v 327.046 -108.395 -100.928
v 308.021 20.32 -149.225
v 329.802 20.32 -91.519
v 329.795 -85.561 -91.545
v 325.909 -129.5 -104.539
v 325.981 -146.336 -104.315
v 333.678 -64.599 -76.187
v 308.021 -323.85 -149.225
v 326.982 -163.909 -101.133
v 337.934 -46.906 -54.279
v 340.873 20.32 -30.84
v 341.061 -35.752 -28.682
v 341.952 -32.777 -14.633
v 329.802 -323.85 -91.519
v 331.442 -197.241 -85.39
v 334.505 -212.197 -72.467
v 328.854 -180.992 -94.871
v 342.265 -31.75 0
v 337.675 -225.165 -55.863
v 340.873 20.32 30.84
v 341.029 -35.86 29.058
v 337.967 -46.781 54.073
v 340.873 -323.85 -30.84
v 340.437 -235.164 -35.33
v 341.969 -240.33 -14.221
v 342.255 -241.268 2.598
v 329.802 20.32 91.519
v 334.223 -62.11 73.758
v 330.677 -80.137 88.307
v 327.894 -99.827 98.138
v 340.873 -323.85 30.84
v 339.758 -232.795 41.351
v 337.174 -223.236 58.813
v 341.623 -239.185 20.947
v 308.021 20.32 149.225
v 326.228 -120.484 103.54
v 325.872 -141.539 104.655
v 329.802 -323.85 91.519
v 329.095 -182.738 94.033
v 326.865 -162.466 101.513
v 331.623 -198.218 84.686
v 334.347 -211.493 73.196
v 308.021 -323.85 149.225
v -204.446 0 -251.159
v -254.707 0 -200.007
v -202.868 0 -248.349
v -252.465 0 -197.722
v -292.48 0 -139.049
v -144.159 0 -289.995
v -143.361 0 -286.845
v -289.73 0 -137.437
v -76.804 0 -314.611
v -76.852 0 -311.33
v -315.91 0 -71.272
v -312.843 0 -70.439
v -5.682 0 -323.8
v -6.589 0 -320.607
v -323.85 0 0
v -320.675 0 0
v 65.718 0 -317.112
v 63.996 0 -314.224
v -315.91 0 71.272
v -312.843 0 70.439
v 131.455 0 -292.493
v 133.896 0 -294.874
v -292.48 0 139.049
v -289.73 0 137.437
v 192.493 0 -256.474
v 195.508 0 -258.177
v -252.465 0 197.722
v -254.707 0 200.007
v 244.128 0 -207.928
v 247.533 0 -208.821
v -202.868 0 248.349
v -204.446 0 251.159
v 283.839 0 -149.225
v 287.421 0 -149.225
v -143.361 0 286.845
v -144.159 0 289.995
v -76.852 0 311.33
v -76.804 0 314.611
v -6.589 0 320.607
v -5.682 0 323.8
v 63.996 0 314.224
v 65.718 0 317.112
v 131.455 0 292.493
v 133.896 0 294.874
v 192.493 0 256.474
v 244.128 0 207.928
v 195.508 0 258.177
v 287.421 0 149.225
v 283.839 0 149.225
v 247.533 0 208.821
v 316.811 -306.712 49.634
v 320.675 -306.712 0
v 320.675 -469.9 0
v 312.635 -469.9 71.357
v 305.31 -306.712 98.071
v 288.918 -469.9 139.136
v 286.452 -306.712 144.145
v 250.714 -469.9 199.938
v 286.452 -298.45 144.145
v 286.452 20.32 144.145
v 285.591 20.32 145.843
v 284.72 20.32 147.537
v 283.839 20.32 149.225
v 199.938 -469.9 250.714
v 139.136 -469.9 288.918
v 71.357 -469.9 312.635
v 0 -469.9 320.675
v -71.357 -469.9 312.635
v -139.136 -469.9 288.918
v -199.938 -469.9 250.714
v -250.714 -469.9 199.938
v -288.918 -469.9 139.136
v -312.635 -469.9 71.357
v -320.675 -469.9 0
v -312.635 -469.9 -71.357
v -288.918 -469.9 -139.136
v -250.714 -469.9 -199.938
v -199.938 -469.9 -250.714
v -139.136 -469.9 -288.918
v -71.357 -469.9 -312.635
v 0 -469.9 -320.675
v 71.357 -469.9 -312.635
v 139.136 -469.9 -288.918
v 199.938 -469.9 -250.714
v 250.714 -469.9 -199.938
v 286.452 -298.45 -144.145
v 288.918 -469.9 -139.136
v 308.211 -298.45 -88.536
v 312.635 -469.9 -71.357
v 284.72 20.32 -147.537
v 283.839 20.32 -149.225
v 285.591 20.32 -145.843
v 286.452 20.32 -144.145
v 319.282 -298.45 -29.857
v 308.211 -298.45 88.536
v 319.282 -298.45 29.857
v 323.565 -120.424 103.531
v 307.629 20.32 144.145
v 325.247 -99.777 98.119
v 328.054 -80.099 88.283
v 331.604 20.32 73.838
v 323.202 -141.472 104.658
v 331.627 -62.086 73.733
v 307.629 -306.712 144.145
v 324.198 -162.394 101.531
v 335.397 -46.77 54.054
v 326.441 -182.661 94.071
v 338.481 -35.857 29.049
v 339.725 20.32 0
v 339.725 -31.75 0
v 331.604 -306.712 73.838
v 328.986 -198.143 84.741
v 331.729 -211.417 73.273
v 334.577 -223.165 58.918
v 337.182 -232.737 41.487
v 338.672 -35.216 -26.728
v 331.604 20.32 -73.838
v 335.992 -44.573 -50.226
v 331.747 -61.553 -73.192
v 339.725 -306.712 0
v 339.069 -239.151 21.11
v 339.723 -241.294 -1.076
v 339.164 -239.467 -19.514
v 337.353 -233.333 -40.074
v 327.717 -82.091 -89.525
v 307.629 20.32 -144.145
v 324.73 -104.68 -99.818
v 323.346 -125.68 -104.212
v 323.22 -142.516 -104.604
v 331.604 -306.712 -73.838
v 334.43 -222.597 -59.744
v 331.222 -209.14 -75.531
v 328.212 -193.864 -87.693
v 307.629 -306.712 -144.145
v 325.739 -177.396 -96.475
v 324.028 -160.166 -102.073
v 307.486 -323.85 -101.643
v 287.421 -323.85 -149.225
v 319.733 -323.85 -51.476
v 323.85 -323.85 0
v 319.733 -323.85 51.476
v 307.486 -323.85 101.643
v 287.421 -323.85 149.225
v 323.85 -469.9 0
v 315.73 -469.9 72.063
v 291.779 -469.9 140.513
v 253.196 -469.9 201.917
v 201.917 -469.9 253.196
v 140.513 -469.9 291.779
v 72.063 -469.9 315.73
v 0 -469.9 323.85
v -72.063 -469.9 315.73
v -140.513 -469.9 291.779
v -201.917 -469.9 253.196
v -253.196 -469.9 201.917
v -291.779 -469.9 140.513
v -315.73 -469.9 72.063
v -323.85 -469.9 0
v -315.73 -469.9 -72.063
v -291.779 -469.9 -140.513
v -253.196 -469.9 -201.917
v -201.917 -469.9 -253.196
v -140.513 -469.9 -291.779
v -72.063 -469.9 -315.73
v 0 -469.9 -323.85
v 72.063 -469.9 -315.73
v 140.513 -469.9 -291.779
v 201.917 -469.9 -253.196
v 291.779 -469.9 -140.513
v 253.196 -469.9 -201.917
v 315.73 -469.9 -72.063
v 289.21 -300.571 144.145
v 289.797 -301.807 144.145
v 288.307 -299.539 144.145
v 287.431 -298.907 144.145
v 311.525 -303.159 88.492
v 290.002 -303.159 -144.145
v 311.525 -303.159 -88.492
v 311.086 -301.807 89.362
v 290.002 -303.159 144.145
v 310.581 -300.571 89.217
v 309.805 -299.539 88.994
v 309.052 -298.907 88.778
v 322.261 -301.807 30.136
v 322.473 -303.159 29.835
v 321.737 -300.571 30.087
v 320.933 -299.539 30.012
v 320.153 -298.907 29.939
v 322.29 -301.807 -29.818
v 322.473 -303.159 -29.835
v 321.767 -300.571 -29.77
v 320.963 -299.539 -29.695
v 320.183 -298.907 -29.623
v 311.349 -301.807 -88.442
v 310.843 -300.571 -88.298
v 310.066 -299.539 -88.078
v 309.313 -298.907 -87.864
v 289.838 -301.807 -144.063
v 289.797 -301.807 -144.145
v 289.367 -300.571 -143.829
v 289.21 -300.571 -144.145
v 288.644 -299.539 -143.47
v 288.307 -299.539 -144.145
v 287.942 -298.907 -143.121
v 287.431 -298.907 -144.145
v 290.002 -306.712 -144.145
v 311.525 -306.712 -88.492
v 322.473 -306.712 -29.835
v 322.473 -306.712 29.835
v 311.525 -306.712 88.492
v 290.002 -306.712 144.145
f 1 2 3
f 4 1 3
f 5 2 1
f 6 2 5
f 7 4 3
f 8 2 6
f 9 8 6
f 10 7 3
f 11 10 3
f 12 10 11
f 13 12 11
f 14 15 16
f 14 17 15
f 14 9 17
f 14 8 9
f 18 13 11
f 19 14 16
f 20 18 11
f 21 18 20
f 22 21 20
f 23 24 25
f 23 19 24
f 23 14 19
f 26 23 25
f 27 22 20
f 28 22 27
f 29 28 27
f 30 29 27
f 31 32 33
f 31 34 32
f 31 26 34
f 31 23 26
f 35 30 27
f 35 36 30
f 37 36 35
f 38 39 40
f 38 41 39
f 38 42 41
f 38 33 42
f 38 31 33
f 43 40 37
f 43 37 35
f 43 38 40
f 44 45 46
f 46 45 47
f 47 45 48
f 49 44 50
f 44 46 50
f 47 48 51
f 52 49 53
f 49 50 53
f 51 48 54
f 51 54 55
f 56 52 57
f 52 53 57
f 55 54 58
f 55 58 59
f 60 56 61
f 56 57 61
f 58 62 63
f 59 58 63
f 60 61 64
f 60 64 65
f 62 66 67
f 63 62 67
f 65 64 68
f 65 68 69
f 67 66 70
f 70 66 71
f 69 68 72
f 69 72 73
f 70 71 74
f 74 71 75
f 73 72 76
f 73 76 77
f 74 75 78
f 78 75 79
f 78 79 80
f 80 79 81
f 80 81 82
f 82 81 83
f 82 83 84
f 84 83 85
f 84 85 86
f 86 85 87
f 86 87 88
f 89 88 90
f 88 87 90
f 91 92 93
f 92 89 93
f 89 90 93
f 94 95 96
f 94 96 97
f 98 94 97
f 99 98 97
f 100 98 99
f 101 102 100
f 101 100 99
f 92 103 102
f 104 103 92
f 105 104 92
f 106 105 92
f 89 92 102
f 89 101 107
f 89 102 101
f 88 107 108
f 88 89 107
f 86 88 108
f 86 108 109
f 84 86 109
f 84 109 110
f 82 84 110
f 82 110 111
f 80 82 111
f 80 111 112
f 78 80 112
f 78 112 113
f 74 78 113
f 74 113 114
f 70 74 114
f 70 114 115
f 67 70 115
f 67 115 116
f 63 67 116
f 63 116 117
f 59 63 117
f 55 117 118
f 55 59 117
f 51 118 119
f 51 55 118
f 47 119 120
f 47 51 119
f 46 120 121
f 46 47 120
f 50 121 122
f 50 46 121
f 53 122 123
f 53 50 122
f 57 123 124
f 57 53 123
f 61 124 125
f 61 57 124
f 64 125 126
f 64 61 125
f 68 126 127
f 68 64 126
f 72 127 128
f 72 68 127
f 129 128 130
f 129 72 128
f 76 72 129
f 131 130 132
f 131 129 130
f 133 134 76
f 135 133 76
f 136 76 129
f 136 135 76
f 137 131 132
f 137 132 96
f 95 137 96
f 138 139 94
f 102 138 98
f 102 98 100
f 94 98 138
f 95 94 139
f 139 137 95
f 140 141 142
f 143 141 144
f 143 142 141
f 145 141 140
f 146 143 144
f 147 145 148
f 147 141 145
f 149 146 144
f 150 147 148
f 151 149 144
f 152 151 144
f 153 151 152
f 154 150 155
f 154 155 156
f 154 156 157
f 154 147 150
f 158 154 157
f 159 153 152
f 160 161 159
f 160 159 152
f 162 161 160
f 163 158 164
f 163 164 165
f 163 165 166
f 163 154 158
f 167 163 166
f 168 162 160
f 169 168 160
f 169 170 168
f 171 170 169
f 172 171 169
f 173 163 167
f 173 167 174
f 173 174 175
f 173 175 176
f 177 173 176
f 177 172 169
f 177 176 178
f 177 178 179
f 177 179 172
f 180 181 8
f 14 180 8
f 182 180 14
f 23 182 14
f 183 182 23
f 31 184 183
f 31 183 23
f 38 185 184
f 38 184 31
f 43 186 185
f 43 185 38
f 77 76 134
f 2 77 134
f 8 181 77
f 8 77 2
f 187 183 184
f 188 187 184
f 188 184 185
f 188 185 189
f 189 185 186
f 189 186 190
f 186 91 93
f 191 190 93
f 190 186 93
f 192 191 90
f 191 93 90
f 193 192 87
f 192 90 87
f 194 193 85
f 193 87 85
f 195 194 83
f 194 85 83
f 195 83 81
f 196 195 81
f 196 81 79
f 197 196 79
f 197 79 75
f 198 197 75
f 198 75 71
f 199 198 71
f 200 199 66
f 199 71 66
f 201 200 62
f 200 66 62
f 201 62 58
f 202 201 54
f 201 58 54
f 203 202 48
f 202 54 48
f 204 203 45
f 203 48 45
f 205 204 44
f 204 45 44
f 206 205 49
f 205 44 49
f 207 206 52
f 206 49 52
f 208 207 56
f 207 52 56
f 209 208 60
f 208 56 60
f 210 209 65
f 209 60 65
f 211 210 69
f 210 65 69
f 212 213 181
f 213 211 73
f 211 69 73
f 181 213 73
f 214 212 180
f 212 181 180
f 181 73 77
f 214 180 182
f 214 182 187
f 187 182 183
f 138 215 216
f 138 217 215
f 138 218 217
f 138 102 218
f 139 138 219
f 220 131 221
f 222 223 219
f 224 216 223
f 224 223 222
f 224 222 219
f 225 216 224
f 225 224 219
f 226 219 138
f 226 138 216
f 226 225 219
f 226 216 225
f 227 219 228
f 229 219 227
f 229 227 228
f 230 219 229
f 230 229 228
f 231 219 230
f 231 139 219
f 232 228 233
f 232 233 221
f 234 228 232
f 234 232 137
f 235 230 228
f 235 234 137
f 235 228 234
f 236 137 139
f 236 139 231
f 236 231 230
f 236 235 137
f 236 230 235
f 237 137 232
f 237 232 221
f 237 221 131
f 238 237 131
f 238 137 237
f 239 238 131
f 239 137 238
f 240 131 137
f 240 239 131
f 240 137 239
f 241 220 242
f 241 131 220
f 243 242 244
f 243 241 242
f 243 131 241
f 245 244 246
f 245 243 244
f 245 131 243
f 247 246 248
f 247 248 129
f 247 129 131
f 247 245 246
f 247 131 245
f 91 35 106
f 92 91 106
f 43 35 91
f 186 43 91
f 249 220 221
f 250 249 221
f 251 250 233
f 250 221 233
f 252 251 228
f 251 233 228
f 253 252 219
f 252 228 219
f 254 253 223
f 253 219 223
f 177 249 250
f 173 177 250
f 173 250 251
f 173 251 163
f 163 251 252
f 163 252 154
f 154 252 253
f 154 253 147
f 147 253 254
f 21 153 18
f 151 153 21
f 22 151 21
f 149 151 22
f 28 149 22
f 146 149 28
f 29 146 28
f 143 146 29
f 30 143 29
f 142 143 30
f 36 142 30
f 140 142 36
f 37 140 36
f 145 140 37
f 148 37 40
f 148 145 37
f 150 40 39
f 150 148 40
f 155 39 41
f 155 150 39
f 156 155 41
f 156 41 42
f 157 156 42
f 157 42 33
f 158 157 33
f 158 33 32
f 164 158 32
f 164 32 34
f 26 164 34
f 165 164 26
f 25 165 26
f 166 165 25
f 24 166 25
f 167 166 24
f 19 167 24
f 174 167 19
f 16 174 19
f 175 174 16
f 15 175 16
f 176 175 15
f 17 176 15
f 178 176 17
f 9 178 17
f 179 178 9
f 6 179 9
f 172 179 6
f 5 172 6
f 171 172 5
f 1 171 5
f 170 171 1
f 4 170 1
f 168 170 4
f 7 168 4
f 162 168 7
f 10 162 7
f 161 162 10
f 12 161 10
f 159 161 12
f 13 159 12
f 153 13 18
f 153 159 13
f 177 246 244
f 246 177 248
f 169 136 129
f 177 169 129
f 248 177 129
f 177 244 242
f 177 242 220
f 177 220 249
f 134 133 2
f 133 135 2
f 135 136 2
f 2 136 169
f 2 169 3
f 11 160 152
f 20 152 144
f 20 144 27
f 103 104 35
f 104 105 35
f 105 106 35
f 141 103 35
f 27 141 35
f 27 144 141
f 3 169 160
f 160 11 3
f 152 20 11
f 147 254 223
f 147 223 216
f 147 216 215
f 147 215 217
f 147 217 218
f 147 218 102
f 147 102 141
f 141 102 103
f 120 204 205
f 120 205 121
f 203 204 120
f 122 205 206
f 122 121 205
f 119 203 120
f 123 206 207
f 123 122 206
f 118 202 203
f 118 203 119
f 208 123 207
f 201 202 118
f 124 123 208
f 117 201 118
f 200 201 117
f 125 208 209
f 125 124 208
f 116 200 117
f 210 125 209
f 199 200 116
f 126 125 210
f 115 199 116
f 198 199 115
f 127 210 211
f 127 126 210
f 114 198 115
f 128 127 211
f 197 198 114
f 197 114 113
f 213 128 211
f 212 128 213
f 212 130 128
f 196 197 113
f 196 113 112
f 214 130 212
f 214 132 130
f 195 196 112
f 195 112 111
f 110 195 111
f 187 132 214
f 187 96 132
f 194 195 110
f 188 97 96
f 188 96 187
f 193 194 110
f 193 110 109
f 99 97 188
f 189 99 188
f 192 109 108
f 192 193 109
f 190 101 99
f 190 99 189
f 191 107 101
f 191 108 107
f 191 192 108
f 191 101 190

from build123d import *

# Parameters (mm, degrees)
F0_R        = 323.85
F0_R_2      = 320.675
F1_DEPTH    = 469.9
F2_W        = 298.45
F2_H        = 298.45
F3_DEPTH    = 595.884
F5_DEPTH    = 612.14
F6_T4_ANGLE = 57.0256517653
F7_R        = 669.2625565618
F7_R_2      = 339.725
F7_R_3      = 320.675
F8_DEPTH    = 561.34
F10_DEPTH   = 323.85
F11_R       = 104.775
F12_DEPTH   = 947.42
F13_DEPTH   = 20.32


# Not quite as in the source:
# - a fillet or chamfer that OpenCascade refuses, or shapes differently, is made with other operations: its cross-section is extruded or revolved along the edge and cut away or added


with BuildPart() as f1:
    # F0 (on Front) → F1 (new body)
    with BuildSketch(Plane.XZ):
        Circle(F0_R)
        Circle(F0_R_2, mode=Mode.SUBTRACT)
    extrude(amount=F1_DEPTH)

    # F2 (on Right) → F3 (cut)
    with BuildSketch(Plane.YZ):
        with Locations((-149.225, 0)):
            Rectangle(F2_W, F2_H)
    extrude(amount=F3_DEPTH, mode=Mode.SUBTRACT)

    # F4 (on Right) → F5 (join)
    with BuildSketch(Plane.YZ):
        Polygon((20.32, 149.225), (0, 149.225), (-323.85, 149.225), (-323.85, -149.225), (0, -149.225), (20.32, -149.225), (20.32, -144.145), (0, -144.145), (-17.1384390951, -144.145), (-306.7115609049, -144.145), (-306.7115609049, 144.145), (-17.1384390951, 144.145), (0, 144.145), (20.32, 144.145), align=None)
    extrude(amount=F5_DEPTH)

    # F6: fillet of radius 5.08 on 1 edges, made by hand


with BuildPart() as f6_tool2:
    # F6_s3 → F6_t4 (revolve)
    with BuildSketch(Plane(origin=(0, 0, 0), x_dir=(0, 1, 0), z_dir=(-0.4773554749, 0, 0.8787102768))):
        with BuildLine():
            ThreePointArc((-303.1592860393, -323.85), (-300.3194797079, -322.9821134838), (-298.45, -320.675))
            Line((-298.45, -320.675), (-298.45, -323.85))
            Line((-298.45, -323.85), (-303.1592860393, -323.85))
        make_face()
    revolve(axis=Axis((0, -298.45, 0), (0, 1, 0)), revolution_arc=F6_T4_ANGLE)

    split(bisect_by=Plane.XY.offset(-144.145), keep=Keep.TOP)

    split(bisect_by=Plane.XY.offset(144.145), keep=Keep.BOTTOM)


with BuildPart() as f1_1:
    add(f1.part)

    # F6_t1: cut F6_tool2
    add(f6_tool2.part, mode=Mode.SUBTRACT)

    # F7 (on Front) → F8 (cut, symmetric)
    with BuildSketch(Plane.XZ):
        Circle(F7_R)
        Circle(F7_R_2, mode=Mode.SUBTRACT)
        Circle(F7_R_3)
    extrude(amount=F8_DEPTH, both=True, mode=Mode.SUBTRACT)

    # F9 (on Front) → F10 (join, through all)
    with BuildSketch(Plane.XZ):
        with BuildLine():
            ThreePointArc((305.1966169537, 149.225), (339.725, 0), (305.1966169537, -149.225))
            Line((305.1966169537, -149.225), (308.0214758747, -149.225))
            ThreePointArc((308.0214758747, -149.225), (342.265, 0), (308.0214758747, 149.225))
            Line((308.0214758747, 149.225), (305.1966169537, 149.225))
        make_face()
    extrude(amount=F10_DEPTH)

    # F11 (on Right) → F12 (cut)
    with BuildSketch(Plane.YZ):
        with Locations((-136.525, 0)):
            Circle(F11_R)
    extrude(amount=F12_DEPTH, mode=Mode.SUBTRACT)

    # F9 (on Front) → F13 (join)
    with BuildSketch(Plane.XZ):
        with BuildLine():
            ThreePointArc((305.1966169537, 149.225), (339.725, 0), (305.1966169537, -149.225))
            Line((305.1966169537, -149.225), (308.0214758747, -149.225))
            ThreePointArc((308.0214758747, -149.225), (342.265, 0), (308.0214758747, 149.225))
            Line((308.0214758747, 149.225), (305.1966169537, 149.225))
        make_face()
    extrude(amount=-F13_DEPTH)


solid = f1_1.part
